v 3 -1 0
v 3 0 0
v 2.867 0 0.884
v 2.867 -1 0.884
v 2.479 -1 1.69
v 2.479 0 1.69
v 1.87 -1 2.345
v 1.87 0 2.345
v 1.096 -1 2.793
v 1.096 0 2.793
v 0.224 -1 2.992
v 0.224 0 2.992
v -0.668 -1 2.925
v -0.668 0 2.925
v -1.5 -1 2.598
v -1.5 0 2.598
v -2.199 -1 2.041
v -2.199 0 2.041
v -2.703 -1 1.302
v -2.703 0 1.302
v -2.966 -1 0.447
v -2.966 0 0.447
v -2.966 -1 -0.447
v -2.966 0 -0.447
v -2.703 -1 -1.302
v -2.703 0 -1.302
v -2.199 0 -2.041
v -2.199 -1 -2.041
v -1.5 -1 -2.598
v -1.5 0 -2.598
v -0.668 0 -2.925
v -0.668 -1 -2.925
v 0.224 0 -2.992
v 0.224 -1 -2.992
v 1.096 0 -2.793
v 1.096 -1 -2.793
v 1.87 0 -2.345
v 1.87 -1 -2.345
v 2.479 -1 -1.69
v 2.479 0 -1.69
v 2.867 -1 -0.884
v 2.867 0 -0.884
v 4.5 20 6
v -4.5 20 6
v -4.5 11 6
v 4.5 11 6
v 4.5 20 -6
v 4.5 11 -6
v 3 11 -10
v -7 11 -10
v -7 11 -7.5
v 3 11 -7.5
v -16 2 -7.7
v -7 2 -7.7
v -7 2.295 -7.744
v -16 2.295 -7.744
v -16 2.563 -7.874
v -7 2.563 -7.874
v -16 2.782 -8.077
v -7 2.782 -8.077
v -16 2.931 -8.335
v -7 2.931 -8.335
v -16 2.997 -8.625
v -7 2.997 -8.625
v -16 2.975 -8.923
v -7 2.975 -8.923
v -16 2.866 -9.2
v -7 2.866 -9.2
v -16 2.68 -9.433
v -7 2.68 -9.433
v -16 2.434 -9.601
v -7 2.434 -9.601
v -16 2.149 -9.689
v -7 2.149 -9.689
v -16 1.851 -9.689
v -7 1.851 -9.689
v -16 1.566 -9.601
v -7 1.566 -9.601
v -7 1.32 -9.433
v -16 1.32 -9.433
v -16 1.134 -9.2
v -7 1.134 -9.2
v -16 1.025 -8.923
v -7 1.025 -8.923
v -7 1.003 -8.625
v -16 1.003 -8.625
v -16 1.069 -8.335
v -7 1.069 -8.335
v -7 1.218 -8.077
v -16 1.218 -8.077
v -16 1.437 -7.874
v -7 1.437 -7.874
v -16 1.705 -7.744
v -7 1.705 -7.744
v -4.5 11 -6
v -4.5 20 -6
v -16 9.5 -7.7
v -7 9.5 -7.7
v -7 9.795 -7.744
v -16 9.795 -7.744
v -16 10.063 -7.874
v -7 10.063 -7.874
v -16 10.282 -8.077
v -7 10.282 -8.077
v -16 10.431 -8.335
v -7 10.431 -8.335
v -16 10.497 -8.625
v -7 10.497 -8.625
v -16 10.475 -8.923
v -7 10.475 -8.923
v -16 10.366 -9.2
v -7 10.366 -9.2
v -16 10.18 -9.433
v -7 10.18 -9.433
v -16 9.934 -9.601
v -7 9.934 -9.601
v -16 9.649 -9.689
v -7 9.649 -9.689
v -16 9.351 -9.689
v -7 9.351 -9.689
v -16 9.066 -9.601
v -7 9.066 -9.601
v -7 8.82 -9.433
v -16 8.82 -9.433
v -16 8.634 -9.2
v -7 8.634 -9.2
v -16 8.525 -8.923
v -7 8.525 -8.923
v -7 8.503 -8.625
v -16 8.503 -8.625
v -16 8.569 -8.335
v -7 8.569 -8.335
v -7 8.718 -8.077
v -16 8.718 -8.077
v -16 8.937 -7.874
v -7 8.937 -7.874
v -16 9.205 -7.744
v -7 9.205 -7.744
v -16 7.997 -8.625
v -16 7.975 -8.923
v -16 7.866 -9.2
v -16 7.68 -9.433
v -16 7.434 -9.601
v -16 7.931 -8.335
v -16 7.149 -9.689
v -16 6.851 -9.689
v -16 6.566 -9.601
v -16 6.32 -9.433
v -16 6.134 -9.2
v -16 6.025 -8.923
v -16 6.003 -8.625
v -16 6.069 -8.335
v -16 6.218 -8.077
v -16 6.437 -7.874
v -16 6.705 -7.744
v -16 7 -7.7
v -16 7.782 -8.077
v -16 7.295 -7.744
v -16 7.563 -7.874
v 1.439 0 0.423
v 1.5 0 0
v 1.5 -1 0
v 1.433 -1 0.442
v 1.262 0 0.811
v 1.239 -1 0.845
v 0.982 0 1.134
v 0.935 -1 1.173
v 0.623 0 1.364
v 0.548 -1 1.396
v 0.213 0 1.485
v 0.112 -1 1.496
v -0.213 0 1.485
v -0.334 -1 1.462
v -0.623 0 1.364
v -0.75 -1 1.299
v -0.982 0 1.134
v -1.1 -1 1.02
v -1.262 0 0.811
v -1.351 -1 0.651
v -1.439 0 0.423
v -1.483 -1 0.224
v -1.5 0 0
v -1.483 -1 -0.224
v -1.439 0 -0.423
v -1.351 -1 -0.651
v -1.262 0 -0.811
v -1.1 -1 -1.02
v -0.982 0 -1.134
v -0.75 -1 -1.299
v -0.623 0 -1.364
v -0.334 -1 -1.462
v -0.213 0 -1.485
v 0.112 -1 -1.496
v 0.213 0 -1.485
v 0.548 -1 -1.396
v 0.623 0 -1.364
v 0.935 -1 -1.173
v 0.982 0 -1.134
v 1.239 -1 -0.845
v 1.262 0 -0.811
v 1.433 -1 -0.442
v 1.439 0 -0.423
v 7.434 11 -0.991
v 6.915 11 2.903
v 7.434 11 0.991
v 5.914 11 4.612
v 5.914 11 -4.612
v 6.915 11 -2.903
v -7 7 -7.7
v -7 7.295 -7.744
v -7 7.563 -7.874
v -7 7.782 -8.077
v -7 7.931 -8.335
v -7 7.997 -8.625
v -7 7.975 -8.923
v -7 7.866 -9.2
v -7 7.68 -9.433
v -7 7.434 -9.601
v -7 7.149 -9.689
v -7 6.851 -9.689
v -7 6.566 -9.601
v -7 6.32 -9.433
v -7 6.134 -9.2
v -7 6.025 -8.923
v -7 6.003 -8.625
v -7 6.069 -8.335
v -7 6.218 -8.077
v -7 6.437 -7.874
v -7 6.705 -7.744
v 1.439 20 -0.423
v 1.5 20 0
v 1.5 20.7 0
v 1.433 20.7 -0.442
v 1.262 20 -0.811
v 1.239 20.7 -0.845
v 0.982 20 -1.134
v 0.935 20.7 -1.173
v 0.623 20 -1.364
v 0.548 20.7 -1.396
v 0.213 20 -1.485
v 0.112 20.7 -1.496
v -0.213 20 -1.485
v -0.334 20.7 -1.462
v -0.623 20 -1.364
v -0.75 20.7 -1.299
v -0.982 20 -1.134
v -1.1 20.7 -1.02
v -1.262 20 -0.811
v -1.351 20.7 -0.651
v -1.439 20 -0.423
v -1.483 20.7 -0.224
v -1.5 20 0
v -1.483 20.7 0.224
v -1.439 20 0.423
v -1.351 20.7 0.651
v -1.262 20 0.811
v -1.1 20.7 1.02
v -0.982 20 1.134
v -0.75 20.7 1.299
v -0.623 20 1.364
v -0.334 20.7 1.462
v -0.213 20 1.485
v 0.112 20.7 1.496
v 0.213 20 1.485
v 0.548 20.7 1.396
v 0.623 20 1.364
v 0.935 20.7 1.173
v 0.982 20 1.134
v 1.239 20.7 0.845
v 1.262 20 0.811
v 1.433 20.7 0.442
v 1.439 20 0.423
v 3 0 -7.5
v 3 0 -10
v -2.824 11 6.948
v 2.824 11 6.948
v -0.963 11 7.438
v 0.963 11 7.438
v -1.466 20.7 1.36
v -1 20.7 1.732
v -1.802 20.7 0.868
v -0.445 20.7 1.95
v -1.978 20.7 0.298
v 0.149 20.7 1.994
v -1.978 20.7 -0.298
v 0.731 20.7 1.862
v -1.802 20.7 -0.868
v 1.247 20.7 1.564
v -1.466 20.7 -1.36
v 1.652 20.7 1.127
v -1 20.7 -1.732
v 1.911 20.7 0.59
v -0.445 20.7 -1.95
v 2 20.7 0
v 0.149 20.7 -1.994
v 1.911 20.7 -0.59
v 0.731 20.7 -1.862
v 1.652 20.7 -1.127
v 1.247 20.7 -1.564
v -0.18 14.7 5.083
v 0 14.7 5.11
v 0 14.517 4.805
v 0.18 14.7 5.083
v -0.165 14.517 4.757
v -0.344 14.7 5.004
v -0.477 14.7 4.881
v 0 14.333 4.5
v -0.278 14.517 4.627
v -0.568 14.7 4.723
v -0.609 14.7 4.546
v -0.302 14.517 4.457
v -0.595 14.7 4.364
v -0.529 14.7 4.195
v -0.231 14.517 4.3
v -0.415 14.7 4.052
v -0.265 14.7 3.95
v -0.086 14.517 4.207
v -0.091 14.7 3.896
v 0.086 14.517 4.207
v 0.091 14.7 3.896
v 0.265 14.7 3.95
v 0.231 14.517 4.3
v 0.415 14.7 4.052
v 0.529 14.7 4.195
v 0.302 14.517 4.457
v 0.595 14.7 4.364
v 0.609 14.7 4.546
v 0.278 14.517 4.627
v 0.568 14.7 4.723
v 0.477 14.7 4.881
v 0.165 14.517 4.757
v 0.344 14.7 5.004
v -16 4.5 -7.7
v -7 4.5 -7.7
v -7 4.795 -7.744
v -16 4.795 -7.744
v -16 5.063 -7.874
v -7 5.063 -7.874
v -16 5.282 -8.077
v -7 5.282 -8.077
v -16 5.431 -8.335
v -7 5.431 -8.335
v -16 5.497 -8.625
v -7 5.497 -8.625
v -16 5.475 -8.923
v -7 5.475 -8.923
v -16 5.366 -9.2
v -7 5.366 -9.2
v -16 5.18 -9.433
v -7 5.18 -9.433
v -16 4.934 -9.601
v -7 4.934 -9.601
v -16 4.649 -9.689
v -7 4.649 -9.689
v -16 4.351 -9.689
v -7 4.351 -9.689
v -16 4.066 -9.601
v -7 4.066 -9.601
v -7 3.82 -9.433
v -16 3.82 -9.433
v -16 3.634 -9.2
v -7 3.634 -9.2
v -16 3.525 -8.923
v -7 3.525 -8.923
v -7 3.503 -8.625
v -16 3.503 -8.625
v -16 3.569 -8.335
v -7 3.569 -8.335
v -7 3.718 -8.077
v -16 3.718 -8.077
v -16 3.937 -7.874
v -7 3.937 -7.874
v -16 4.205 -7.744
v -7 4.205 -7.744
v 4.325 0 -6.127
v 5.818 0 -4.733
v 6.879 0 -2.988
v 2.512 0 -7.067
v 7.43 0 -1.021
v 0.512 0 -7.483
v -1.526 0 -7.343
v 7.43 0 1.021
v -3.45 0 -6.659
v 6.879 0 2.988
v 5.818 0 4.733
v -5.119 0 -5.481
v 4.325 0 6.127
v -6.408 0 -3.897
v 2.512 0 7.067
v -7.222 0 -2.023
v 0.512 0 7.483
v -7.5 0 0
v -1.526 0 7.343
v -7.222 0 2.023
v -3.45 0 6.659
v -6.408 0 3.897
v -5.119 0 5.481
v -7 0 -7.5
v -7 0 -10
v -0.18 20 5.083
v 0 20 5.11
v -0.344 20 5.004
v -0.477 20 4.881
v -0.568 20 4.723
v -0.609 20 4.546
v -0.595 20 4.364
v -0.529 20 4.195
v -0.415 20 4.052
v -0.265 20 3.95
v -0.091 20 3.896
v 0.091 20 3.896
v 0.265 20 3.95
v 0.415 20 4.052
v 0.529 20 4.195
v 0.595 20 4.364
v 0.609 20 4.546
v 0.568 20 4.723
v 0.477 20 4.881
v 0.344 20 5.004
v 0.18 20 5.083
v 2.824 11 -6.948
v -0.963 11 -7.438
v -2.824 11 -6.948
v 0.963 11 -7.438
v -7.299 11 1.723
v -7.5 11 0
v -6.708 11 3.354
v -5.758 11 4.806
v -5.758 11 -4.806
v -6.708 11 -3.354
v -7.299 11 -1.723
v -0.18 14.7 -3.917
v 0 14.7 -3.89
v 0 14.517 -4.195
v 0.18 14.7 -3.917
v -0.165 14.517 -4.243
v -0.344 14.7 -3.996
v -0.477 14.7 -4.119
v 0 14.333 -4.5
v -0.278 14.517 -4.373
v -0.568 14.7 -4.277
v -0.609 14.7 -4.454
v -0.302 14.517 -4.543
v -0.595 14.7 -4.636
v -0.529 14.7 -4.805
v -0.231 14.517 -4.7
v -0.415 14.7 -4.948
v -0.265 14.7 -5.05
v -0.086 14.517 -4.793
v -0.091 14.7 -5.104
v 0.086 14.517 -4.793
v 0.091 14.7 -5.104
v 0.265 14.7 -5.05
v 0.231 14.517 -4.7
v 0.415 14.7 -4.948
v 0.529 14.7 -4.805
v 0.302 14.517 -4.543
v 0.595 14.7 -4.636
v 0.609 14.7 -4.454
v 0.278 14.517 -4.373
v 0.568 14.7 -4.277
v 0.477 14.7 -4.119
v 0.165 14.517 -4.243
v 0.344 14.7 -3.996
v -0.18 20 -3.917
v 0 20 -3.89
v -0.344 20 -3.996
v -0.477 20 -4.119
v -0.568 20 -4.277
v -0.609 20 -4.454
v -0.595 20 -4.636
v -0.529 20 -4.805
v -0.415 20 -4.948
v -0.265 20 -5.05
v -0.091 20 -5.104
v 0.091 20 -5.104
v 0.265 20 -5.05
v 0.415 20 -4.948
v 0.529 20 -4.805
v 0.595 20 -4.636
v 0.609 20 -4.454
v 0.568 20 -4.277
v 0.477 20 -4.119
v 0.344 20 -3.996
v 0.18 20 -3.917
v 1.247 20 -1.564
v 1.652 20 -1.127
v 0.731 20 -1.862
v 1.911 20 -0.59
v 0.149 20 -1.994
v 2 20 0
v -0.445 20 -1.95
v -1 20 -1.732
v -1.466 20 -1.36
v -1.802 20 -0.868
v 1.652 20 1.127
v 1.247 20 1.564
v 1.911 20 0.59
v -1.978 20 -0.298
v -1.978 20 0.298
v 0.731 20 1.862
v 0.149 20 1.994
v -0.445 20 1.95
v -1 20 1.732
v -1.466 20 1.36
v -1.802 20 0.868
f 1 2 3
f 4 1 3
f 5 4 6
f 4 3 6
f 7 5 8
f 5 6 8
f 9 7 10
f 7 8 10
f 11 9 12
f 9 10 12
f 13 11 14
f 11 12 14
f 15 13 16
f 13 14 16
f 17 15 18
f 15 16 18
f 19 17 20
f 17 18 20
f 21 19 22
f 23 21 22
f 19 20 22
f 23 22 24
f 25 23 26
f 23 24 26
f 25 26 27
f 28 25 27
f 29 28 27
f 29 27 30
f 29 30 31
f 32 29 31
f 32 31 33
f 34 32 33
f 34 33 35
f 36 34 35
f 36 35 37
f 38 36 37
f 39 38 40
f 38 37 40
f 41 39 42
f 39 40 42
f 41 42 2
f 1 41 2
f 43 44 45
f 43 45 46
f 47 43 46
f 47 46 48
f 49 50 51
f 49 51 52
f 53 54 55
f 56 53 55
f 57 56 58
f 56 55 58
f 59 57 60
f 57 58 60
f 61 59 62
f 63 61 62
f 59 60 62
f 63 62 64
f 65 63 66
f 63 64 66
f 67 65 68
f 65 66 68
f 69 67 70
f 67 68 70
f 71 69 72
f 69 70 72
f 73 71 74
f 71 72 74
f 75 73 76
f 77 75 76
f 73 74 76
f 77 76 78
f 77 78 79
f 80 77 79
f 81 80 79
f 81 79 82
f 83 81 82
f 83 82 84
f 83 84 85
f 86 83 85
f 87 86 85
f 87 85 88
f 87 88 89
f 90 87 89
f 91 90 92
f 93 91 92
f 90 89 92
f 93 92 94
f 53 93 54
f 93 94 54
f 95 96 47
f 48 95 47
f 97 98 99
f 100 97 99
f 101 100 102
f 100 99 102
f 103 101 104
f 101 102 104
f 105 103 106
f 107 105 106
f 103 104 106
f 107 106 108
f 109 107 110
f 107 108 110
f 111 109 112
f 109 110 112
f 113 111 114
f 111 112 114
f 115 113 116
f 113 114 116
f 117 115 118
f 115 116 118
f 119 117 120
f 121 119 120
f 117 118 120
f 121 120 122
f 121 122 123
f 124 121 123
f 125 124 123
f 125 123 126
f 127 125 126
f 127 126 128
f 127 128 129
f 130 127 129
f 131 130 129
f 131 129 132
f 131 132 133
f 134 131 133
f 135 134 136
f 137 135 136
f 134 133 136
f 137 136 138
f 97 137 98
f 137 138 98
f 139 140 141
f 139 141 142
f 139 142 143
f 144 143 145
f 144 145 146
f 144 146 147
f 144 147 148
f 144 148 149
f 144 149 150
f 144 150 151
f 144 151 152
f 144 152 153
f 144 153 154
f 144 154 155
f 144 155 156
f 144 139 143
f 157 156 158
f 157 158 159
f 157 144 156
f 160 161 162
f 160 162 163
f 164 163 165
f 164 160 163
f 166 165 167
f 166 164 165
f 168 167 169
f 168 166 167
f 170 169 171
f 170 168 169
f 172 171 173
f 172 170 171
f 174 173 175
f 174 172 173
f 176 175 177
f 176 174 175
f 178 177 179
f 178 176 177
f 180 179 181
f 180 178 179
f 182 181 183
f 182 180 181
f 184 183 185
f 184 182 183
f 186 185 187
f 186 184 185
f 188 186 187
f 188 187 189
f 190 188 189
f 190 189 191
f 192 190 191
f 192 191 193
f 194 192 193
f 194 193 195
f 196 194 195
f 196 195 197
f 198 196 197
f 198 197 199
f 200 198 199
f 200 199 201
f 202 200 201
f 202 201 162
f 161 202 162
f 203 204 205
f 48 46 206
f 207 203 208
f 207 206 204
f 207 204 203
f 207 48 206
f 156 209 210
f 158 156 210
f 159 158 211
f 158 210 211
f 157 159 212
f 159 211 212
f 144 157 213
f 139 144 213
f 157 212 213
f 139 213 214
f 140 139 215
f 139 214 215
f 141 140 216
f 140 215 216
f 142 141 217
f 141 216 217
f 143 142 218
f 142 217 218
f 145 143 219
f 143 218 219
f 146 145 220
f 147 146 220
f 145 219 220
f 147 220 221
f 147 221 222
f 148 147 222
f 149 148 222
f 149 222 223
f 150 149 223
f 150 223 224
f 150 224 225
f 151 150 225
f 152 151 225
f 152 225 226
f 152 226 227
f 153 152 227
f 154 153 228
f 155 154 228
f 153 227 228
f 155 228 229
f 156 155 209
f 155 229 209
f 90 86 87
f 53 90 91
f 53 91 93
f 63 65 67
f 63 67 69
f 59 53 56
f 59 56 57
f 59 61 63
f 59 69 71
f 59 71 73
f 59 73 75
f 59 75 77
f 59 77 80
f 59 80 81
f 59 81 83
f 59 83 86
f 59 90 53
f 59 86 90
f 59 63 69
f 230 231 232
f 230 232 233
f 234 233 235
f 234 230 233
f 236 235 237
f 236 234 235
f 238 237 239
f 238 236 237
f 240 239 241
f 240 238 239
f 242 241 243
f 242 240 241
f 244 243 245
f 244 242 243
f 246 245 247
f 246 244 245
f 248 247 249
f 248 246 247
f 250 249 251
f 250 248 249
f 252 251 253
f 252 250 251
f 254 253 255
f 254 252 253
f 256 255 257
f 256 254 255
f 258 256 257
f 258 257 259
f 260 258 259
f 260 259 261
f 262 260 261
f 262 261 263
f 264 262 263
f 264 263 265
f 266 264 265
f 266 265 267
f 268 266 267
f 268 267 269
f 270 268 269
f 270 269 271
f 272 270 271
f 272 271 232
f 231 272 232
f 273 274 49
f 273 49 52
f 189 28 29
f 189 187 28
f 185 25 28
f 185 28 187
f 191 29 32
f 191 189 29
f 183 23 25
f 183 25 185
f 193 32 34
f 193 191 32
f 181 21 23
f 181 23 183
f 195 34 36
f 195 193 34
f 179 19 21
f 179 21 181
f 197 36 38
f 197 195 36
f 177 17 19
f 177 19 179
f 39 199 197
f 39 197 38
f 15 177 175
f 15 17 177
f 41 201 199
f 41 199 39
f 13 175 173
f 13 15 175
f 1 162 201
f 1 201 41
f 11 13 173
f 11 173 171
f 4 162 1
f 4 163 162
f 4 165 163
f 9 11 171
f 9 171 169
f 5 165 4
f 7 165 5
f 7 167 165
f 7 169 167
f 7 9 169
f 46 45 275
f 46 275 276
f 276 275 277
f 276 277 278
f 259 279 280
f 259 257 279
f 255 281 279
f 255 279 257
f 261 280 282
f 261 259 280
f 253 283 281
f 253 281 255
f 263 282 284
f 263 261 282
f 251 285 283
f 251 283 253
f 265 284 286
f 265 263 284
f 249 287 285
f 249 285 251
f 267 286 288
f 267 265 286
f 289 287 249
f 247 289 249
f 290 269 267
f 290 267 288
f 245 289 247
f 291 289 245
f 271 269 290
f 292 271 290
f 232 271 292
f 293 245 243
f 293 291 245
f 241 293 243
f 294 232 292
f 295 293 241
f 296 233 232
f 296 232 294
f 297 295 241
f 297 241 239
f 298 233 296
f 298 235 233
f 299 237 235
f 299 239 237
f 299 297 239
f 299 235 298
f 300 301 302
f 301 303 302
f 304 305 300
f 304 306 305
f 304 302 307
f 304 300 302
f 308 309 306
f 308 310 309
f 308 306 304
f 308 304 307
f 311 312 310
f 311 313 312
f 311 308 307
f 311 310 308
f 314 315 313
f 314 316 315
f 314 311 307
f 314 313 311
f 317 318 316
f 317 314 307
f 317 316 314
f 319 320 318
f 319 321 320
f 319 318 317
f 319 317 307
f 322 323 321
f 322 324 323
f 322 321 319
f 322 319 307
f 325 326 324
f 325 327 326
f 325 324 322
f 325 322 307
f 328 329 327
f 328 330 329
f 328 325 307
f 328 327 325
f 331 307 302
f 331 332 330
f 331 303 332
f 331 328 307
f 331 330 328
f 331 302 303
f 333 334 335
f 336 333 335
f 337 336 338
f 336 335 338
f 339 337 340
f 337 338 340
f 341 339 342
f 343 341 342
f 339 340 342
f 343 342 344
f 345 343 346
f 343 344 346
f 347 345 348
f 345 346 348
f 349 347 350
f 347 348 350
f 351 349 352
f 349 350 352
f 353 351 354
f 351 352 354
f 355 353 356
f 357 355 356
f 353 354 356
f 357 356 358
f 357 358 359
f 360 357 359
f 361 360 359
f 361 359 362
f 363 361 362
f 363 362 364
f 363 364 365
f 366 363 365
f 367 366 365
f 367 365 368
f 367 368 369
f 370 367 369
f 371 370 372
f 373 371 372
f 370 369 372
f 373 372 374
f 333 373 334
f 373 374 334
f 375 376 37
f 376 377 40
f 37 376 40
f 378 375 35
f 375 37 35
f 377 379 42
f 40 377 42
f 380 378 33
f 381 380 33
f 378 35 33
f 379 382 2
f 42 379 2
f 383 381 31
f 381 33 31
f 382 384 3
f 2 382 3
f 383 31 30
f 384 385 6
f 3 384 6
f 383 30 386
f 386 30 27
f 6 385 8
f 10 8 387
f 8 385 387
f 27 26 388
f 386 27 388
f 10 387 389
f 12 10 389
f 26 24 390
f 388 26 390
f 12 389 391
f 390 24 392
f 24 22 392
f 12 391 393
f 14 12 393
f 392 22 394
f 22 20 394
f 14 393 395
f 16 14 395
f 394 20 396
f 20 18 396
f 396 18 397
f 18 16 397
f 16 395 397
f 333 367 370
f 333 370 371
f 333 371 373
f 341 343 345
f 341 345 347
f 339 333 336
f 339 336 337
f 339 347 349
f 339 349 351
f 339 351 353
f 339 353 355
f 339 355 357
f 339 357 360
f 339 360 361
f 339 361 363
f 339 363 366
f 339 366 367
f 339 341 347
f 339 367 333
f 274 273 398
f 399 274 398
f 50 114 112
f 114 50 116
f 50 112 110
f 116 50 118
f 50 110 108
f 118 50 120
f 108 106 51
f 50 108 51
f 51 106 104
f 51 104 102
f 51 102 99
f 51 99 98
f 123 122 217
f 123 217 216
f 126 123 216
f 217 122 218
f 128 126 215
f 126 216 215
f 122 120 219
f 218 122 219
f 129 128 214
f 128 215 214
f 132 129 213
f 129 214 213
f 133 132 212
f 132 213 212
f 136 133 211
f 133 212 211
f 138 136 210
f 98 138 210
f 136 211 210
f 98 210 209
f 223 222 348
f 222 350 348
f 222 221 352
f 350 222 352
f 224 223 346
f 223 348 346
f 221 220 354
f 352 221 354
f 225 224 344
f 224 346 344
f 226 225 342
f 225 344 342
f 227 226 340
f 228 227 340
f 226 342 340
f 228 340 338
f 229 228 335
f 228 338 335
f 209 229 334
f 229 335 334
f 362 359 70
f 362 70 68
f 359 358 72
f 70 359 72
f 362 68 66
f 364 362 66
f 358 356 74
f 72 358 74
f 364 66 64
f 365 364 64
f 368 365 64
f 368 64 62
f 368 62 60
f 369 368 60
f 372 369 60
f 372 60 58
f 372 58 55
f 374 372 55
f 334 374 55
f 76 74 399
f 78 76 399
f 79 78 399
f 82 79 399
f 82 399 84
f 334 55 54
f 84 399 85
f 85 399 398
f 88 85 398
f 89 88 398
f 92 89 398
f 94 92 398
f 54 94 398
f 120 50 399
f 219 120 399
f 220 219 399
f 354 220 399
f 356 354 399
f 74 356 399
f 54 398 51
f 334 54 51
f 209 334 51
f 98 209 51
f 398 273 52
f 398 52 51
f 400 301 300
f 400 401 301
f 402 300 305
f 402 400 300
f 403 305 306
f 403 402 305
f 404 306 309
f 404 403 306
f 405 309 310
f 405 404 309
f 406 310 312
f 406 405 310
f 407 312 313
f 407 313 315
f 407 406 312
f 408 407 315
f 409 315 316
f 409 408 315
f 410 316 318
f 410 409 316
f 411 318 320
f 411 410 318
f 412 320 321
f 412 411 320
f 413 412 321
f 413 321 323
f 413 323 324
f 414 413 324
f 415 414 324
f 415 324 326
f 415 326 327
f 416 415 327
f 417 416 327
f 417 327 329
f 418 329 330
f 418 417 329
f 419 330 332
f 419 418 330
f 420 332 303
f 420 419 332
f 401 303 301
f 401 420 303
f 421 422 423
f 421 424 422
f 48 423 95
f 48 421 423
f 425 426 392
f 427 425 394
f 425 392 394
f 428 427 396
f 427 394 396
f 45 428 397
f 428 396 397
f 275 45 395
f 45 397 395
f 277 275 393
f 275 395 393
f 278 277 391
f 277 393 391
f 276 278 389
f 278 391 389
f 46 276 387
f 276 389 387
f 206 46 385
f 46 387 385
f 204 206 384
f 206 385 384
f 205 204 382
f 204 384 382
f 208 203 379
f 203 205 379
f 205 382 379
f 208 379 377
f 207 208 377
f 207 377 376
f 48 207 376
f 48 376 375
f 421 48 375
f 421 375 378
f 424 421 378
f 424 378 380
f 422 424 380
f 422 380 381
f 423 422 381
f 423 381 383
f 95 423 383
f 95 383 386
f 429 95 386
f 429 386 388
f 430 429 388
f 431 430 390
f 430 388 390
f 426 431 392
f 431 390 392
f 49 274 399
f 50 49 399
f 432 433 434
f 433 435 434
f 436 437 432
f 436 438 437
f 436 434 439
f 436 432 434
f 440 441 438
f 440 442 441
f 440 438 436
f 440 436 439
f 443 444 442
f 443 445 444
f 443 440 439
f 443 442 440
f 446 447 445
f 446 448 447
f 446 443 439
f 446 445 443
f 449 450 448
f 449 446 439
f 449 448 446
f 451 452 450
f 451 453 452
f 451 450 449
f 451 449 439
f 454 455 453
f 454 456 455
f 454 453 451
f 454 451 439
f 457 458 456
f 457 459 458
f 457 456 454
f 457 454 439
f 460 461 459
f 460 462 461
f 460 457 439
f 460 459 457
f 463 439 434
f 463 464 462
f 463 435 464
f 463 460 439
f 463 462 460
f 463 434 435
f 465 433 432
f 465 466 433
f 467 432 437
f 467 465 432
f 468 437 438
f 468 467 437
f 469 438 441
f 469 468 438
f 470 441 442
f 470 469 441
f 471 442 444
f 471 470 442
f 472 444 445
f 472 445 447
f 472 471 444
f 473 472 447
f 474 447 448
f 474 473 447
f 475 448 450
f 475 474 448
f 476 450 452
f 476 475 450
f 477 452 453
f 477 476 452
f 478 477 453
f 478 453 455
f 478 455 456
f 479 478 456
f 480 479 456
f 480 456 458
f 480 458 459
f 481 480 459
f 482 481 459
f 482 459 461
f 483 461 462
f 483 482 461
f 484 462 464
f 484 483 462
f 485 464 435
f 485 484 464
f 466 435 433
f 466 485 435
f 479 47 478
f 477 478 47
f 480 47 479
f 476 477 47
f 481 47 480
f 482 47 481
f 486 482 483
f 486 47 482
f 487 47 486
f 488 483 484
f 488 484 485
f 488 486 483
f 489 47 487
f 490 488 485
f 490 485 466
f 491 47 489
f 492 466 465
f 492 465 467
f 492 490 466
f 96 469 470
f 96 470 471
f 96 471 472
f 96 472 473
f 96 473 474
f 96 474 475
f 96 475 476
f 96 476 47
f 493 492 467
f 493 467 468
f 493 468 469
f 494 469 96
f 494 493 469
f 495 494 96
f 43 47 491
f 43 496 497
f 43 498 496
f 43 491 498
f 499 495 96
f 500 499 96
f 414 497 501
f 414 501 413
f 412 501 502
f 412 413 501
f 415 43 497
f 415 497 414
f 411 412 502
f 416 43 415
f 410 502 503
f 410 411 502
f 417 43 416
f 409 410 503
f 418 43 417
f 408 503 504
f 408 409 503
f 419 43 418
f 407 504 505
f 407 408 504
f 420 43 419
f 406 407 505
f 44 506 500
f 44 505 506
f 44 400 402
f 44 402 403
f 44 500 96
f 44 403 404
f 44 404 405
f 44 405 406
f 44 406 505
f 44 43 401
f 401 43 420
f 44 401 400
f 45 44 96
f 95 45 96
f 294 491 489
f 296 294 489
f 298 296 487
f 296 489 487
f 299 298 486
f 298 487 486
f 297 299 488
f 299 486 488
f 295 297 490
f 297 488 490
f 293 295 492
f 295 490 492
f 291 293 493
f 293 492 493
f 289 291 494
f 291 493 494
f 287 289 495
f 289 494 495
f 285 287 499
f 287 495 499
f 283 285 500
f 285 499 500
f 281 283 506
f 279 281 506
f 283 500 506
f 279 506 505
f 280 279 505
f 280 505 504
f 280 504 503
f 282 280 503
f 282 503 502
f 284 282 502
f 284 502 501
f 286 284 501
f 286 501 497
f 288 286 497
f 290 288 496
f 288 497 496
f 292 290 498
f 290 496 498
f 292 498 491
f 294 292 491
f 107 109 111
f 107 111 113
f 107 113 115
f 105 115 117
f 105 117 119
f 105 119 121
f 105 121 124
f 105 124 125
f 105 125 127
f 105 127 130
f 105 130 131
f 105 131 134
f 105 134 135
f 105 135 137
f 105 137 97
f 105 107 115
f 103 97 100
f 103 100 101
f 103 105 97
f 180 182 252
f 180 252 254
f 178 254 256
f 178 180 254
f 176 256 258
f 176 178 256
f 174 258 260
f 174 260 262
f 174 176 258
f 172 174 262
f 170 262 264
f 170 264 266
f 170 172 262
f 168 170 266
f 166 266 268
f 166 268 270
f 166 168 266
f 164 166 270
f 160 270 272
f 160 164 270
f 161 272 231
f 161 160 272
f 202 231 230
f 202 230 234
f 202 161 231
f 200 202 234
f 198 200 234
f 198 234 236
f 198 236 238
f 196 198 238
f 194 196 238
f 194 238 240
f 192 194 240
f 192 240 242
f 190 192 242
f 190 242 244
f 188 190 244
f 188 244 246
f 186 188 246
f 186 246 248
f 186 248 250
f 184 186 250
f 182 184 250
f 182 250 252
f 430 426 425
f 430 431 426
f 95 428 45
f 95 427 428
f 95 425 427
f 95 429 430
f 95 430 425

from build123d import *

# Parameters (mm, degrees)
SKETCH1_W          = 10
SKETCH1_H          = 2.5
EXTRUSION3_DEPTH   = 20
SKETCH1_R          = 7.5
SKETCH1_R_2        = 1.5
EXTRUSION3_2_DEPTH = 20
SKETCH2_W          = 30
SKETCH2_H          = 30
SKETCH2_W_2        = 9
SKETCH2_H_2        = 12
EXTRUSION4_DEPTH   = 9
SKETCH3_R          = 1
EXTRUSION5_DEPTH   = 9
HOLE1_AT_2_COUNT   = 2
HOLE1_AT_2_PITCH   = 9
SKETCH6_R          = 3
SKETCH6_R_2        = 1.5
EXTRUSION6_DEPTH   = 1
SKETCH7_R          = 2
SKETCH7_R_2        = 1.5
EXTRUSION7_DEPTH   = 0.7


with BuildPart() as part:
    # Sketch1 → Extrusion3 (new body)
    with BuildSketch(Plane(origin=(0, 0, 0), x_dir=(-1, 0, 0), z_dir=(0, 1, 0))):
        with Locations((2, -8.75)):
            Rectangle(SKETCH1_W, SKETCH1_H)
    extrude(amount=EXTRUSION3_DEPTH)


with BuildPart() as body_2:
    # Sketch1 → Extrusion3 2 (new body)
    with BuildSketch(Plane(origin=(0, 0, 0), x_dir=(-1, 0, 0), z_dir=(0, 1, 0))):
        Circle(SKETCH1_R)
        Circle(SKETCH1_R_2, mode=Mode.SUBTRACT)
    extrude(amount=EXTRUSION3_2_DEPTH)


with BuildPart() as extrusion4_tool:
    # Sketch2 → Extrusion4 (new body)
    with BuildSketch(Plane(origin=(0, 20, 0), x_dir=(1, 0, 0), z_dir=(0, 1, 0))):
        Rectangle(SKETCH2_W, SKETCH2_H)
        Rectangle(SKETCH2_W_2, SKETCH2_H_2, mode=Mode.SUBTRACT)
    extrude(amount=-EXTRUSION4_DEPTH)


with BuildPart() as part_1:
    add(part.part)

    # Extrusion4: cut by extrusion4_tool
    add(extrusion4_tool.part, mode=Mode.SUBTRACT)

    # Sketch3 → Extrusion5 (add)
    with BuildSketch(Plane.ZY.offset(7)):
        with Locations((-8.7, 9.5)):
            Circle(SKETCH3_R)
        with Locations((-8.7, 7)):
            Circle(SKETCH3_R)
        with Locations((-8.7, 4.5)):
            Circle(SKETCH3_R)
        with Locations((-8.7, 2)):
            Circle(SKETCH3_R)
    extrude(amount=EXTRUSION5_DEPTH)


with BuildPart() as body_2_1:
    add(body_2.part)

    # Extrusion4: cut by extrusion4_tool
    add(extrusion4_tool.part, mode=Mode.SUBTRACT)

    # Sketch4 → Hole1 (revolve, cut)
    with BuildSketch(Plane(origin=(0, 20, 4.5), x_dir=(0, 0, 1), z_dir=(1, 0, 0))):
        Polygon((0, 0), (0, 5.666825408), (0.6105, 5.3), (0.6105, 0), align=None)
    hole1 = revolve(axis=Axis((0, 24.244199587, 4.5), (0, -1, 0)), mode=Mode.SUBTRACT)

    # Hole1 at 2: Hole1 ×2
    with Locations(*[(0, 0, -i * HOLE1_AT_2_PITCH) for i in range(1, HOLE1_AT_2_COUNT)]):
        add(hole1, mode=Mode.SUBTRACT)

    # Sketch6 → Extrusion6 (add)
    with BuildSketch(Plane.XZ):
        Circle(SKETCH6_R)
        Circle(SKETCH6_R_2, mode=Mode.SUBTRACT)
    extrude(amount=EXTRUSION6_DEPTH)

    # Sketch7 → Extrusion7 (add)
    with BuildSketch(Plane(origin=(0, 20, 0), x_dir=(1, 0, 0), z_dir=(0, 1, 0))):
        Circle(SKETCH7_R)
        Circle(SKETCH7_R_2, mode=Mode.SUBTRACT)
    extrude(amount=EXTRUSION7_DEPTH)


solid = Compound([part_1.part, body_2_1.part])
